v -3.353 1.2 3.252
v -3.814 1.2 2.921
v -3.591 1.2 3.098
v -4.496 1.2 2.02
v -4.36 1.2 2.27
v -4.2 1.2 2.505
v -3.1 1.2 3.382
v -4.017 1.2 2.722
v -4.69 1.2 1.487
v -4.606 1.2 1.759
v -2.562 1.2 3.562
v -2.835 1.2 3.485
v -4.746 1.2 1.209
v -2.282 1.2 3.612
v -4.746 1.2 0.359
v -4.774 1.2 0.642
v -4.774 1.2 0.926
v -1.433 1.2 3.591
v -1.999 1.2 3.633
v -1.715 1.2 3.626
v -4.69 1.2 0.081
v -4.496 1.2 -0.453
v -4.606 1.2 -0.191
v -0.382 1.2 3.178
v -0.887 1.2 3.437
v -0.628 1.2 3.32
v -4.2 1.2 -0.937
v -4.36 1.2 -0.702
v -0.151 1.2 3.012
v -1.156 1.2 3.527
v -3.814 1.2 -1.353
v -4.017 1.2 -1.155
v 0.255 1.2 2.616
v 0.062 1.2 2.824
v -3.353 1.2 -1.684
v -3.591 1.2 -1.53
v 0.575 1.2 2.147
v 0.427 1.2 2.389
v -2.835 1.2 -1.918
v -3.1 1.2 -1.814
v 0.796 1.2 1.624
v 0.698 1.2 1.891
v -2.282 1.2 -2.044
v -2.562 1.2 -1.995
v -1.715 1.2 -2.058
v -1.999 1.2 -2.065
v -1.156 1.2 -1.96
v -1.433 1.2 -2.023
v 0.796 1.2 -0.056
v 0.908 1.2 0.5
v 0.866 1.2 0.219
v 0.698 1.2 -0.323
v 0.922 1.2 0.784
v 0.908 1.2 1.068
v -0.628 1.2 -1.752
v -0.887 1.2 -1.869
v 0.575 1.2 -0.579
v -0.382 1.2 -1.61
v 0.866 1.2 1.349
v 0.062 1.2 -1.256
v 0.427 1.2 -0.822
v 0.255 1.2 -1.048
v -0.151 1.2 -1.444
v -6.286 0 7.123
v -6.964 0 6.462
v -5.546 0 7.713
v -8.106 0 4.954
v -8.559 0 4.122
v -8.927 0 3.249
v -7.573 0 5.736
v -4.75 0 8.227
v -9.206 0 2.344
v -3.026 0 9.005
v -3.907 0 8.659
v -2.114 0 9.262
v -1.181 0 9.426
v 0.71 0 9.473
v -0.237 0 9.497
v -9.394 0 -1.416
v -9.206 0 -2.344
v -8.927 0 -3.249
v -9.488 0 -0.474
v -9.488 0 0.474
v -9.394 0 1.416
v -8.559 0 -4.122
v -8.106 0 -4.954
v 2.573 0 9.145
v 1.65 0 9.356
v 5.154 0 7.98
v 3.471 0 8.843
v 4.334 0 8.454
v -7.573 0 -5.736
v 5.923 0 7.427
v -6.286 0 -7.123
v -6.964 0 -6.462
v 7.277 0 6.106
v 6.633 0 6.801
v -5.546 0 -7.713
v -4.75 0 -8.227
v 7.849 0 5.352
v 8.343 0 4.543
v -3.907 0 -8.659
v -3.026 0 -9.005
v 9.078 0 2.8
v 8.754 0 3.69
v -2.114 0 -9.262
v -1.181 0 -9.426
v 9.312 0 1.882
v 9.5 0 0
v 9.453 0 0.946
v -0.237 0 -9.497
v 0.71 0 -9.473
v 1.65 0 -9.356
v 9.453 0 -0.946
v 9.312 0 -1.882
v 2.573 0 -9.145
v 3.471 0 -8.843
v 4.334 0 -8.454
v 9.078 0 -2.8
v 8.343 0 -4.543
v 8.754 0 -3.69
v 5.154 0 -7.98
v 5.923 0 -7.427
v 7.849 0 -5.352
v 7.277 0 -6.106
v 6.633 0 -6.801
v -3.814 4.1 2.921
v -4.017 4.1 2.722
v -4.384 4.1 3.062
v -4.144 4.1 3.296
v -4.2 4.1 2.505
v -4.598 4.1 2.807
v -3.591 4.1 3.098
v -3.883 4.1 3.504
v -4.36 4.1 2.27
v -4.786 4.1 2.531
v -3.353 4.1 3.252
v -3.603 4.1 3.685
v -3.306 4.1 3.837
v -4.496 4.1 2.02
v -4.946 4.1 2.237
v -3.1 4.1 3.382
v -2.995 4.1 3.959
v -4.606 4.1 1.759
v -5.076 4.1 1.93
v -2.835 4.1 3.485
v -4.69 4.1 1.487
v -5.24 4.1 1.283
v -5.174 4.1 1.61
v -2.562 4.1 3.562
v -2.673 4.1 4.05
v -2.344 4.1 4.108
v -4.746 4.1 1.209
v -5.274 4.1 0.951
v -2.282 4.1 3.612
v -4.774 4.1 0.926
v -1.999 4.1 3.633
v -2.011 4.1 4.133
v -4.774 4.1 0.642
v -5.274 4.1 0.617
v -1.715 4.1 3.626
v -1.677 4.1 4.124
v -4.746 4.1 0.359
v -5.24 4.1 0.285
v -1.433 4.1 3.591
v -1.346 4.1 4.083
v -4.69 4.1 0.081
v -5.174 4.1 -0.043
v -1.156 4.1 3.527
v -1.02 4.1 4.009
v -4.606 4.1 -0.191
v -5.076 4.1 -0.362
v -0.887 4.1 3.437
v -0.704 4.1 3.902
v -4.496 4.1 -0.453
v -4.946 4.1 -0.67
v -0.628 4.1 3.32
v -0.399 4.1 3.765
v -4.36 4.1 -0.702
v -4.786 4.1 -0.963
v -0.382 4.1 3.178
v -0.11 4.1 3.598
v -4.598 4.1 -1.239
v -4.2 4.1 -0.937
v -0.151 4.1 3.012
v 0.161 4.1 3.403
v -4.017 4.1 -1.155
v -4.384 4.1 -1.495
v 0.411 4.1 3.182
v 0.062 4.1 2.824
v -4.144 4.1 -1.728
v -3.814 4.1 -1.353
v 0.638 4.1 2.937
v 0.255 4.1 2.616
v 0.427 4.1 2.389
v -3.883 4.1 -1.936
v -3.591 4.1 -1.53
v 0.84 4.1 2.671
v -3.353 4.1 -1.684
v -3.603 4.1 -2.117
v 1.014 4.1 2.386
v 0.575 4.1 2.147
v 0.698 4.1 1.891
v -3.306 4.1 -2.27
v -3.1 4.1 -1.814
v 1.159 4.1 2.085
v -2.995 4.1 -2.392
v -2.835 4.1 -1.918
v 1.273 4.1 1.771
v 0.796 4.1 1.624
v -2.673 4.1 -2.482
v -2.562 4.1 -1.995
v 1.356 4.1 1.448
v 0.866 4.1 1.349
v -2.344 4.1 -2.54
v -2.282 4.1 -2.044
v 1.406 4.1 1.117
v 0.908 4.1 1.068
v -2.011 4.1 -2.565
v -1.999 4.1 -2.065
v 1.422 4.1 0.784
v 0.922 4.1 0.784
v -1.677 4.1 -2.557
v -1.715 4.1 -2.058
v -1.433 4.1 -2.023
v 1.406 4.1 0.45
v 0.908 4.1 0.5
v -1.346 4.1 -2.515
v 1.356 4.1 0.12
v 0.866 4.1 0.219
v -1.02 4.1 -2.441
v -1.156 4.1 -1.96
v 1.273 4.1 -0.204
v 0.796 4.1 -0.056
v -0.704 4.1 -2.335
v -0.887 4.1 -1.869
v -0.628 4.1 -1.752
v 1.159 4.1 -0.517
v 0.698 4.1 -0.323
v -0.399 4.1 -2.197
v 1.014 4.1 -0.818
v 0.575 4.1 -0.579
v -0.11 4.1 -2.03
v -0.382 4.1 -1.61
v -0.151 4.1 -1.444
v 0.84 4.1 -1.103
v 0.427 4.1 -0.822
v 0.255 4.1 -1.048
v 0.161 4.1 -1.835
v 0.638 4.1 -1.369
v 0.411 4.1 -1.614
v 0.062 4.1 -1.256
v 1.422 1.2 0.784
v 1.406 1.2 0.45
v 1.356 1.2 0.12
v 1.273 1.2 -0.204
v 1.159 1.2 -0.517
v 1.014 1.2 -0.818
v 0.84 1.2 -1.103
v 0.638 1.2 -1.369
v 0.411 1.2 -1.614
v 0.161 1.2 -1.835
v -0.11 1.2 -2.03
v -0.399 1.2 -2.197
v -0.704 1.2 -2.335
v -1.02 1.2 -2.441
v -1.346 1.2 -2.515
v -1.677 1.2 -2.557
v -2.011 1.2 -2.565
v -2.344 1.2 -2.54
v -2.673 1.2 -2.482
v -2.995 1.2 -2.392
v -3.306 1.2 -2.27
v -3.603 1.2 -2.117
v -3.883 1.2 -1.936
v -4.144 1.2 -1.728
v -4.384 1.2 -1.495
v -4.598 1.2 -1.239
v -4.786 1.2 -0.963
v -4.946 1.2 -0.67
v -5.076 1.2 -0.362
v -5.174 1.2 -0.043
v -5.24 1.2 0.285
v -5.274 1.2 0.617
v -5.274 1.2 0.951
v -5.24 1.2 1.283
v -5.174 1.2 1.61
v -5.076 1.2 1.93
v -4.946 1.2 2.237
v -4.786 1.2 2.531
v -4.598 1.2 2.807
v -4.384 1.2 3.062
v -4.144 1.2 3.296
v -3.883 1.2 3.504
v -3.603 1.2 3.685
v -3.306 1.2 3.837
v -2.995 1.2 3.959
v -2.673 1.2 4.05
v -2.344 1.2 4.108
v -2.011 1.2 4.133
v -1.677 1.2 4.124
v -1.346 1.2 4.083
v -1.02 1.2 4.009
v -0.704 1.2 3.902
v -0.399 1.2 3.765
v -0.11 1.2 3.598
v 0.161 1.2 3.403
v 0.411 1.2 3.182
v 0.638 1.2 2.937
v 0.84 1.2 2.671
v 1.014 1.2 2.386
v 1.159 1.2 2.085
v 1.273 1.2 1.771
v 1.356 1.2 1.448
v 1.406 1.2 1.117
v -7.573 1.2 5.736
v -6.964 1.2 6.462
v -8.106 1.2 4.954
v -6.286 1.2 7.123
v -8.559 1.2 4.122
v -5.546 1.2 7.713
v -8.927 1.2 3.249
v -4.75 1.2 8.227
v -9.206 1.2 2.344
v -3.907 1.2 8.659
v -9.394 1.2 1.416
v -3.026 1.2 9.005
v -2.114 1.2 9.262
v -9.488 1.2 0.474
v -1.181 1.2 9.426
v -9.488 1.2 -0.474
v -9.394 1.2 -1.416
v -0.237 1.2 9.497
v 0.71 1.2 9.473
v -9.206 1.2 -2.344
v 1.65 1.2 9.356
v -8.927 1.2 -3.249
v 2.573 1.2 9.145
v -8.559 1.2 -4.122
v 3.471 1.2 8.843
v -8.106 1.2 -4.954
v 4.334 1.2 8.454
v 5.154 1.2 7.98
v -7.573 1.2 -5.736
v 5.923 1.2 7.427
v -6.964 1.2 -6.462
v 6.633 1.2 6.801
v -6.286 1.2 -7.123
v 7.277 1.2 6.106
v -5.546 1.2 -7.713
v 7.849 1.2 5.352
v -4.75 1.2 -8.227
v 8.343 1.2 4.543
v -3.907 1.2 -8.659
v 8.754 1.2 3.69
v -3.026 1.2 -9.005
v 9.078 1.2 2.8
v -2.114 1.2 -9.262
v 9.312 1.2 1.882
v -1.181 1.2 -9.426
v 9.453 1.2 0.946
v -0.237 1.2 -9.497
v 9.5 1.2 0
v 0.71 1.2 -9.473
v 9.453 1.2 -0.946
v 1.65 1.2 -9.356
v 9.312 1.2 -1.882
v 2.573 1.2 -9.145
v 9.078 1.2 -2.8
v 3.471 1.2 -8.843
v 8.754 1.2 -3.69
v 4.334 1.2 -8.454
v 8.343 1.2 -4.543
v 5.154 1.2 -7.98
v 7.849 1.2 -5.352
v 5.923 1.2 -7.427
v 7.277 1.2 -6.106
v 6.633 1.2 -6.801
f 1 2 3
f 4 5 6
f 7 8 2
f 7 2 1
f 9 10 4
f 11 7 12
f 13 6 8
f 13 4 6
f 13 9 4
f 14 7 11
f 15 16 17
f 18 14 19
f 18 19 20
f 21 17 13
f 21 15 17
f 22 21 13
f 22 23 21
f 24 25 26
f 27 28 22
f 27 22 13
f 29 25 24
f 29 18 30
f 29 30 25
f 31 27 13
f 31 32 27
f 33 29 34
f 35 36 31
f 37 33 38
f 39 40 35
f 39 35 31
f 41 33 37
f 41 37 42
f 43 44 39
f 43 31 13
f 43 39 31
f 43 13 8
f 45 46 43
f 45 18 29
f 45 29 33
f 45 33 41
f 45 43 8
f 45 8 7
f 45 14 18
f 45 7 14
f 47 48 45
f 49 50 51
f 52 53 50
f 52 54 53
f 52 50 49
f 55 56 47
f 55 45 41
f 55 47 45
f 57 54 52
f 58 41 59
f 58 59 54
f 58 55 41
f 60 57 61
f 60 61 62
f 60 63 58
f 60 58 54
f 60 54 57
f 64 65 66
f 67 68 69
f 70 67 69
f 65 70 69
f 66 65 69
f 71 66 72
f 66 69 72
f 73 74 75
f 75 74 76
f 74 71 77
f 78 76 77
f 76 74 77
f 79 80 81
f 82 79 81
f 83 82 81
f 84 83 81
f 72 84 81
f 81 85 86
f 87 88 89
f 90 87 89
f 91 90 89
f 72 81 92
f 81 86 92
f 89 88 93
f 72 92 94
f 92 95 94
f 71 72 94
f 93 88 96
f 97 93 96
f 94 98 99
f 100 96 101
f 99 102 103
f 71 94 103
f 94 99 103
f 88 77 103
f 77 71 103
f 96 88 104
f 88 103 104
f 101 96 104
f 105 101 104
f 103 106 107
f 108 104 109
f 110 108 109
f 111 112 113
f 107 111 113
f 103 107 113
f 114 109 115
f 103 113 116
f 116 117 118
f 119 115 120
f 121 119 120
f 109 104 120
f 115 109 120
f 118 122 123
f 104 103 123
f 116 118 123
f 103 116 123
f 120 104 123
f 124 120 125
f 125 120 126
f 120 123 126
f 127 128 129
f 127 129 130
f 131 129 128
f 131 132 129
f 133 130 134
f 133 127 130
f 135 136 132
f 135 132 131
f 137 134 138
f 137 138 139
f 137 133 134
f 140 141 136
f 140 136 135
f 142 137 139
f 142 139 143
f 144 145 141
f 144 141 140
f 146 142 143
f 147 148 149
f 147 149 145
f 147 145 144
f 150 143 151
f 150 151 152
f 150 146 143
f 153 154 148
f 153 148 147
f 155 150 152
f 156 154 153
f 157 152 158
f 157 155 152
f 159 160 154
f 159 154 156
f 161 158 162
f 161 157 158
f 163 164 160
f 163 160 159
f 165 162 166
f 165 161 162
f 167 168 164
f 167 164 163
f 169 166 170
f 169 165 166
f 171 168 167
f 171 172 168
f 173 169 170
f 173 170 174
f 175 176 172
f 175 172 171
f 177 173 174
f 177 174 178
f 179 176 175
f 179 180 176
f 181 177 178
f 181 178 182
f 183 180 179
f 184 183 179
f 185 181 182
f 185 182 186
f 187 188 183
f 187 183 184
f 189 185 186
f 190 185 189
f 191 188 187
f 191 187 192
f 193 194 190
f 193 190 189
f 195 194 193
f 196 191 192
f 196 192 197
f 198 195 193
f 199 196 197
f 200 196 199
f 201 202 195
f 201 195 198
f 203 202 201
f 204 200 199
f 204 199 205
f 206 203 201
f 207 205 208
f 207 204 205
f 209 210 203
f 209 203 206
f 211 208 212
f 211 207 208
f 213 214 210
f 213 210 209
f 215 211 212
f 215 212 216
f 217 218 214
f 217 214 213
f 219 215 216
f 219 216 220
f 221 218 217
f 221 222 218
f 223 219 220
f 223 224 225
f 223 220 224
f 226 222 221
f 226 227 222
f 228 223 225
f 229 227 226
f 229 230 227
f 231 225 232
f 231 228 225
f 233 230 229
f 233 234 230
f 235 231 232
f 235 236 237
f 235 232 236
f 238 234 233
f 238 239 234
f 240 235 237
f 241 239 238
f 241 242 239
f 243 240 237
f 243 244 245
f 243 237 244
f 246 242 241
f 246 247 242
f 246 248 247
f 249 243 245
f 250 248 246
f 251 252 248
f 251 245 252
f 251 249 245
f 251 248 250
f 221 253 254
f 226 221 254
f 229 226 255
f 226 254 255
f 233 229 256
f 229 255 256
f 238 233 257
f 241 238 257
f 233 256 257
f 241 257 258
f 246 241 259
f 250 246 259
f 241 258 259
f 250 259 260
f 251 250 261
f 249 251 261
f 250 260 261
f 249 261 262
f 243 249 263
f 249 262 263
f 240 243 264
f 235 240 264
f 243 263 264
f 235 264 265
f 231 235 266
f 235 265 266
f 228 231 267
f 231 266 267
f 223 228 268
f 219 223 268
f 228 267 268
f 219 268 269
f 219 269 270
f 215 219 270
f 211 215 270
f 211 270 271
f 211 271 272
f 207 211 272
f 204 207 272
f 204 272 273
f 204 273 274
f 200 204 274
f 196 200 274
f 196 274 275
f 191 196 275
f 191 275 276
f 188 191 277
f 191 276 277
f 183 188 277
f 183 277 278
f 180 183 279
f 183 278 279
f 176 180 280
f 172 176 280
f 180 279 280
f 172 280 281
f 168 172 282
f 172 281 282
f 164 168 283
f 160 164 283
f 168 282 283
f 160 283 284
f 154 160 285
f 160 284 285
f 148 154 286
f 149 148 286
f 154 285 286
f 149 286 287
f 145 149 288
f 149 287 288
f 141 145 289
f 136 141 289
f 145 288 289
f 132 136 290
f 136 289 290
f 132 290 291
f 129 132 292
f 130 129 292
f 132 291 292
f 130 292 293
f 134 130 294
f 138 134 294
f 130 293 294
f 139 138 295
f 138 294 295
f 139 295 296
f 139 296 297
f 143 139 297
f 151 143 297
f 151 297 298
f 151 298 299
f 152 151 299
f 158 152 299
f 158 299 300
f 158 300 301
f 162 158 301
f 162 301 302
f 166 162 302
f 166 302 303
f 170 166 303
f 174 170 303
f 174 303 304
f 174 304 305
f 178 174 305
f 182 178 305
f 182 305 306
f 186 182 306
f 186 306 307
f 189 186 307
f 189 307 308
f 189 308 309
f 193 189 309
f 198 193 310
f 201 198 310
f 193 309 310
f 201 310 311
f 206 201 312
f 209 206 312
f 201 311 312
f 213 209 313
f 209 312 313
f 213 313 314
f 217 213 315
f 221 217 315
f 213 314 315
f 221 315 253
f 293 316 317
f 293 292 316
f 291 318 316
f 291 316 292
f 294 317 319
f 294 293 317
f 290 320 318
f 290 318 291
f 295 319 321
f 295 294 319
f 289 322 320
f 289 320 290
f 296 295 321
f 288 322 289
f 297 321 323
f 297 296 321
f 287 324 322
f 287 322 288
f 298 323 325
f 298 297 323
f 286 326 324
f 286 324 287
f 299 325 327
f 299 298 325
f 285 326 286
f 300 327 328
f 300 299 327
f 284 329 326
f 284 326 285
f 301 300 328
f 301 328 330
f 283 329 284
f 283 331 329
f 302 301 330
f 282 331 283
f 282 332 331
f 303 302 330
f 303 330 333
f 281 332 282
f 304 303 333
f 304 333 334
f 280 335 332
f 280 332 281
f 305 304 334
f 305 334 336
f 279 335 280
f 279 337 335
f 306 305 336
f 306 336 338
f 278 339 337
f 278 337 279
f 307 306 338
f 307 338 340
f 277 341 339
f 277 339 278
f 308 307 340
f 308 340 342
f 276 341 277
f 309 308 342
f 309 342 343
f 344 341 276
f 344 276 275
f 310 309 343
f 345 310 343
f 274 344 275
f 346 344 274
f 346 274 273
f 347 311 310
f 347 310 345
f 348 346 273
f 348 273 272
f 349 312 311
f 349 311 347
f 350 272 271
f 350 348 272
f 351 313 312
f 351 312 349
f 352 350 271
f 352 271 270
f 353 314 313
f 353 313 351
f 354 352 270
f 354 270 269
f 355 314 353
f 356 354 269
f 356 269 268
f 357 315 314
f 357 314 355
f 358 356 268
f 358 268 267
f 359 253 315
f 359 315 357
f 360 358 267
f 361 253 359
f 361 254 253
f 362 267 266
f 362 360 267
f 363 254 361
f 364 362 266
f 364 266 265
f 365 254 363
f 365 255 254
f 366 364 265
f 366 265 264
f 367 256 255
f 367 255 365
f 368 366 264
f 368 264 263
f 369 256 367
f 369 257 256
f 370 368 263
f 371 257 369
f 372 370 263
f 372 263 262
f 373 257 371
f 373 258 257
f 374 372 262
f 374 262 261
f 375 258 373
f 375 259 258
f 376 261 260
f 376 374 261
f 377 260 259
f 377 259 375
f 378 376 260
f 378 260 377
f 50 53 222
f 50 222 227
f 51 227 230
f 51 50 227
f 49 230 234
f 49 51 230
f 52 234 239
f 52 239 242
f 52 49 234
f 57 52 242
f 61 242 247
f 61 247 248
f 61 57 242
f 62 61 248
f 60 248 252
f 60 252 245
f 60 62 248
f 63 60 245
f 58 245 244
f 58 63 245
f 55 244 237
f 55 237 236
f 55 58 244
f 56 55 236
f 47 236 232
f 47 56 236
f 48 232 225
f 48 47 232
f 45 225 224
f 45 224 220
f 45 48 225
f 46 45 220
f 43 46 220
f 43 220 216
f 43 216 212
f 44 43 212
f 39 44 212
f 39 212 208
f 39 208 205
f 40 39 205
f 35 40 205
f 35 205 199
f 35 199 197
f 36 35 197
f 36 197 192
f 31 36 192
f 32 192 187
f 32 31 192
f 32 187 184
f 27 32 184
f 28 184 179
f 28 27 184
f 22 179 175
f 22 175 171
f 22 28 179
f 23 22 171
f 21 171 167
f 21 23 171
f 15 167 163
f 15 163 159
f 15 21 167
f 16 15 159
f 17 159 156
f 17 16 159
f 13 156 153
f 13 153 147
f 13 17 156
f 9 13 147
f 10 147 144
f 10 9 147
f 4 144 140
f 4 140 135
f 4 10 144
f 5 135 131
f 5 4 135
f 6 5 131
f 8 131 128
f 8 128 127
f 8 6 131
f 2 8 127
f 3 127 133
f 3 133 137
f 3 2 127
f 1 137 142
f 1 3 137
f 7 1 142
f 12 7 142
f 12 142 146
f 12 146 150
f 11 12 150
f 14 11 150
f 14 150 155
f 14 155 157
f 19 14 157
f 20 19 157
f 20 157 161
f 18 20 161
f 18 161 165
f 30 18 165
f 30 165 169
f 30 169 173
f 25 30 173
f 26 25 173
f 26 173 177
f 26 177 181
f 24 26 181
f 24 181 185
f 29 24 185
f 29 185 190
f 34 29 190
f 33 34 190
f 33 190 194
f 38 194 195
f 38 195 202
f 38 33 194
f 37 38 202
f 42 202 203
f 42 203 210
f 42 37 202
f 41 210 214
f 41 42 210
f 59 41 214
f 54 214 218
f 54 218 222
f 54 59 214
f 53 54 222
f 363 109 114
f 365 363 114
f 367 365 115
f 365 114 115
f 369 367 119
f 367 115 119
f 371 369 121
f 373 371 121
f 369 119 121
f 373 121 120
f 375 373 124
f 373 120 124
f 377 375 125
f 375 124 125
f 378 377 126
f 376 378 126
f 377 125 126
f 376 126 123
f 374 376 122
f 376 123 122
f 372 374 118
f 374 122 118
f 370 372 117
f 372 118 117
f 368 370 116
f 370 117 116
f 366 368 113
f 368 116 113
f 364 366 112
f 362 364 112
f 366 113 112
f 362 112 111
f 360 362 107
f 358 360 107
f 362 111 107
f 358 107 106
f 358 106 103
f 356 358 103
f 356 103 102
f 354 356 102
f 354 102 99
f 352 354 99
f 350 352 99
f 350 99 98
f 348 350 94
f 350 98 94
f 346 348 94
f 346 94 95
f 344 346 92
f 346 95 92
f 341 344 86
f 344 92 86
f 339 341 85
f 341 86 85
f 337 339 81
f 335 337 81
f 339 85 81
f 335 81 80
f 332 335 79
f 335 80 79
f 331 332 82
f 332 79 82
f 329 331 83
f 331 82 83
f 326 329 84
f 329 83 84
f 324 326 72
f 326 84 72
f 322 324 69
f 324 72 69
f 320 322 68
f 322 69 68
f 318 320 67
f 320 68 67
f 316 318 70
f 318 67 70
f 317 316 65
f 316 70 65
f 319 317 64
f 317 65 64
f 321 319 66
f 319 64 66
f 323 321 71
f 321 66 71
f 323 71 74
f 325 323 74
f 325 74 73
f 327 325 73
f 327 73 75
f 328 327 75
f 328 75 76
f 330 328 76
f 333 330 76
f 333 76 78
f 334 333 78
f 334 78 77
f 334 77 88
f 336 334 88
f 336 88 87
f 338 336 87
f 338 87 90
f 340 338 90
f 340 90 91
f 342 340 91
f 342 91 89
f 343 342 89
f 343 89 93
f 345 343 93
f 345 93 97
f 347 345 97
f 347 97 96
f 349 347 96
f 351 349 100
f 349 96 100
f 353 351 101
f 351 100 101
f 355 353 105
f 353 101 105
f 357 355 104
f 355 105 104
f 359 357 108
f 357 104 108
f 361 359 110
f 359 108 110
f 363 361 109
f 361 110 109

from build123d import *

# Parameters (mm, degrees)
SKETCH1_R           = 9.5
BOSS_EXTRUDE1_DEPTH = 1.2
SKETCH2_R           = 3.35
SKETCH2_R_2         = 2.85
BOSS_EXTRUDE2_DEPTH = 2.9


with BuildPart() as part:
    # Sketch1 → Boss-Extrude1 (new body)
    with BuildSketch(Plane(origin=(0, 0, 0), x_dir=(1, 0, 0), z_dir=(0, 1, 0))):
        Circle(SKETCH1_R)
    extrude(amount=BOSS_EXTRUDE1_DEPTH)

    # Sketch2 → Boss-Extrude2 (add)
    with BuildSketch(Plane(origin=(0, 1.2, 0), x_dir=(1, 0, 0), z_dir=(0, 1, 0))):
        with Locations((-1.927795475, -0.783841227)):
            Circle(SKETCH2_R)
        with Locations((-1.927795475, -0.783841227)):
            Circle(SKETCH2_R_2, mode=Mode.SUBTRACT)
    extrude(amount=BOSS_EXTRUDE2_DEPTH)


solid = part.part
